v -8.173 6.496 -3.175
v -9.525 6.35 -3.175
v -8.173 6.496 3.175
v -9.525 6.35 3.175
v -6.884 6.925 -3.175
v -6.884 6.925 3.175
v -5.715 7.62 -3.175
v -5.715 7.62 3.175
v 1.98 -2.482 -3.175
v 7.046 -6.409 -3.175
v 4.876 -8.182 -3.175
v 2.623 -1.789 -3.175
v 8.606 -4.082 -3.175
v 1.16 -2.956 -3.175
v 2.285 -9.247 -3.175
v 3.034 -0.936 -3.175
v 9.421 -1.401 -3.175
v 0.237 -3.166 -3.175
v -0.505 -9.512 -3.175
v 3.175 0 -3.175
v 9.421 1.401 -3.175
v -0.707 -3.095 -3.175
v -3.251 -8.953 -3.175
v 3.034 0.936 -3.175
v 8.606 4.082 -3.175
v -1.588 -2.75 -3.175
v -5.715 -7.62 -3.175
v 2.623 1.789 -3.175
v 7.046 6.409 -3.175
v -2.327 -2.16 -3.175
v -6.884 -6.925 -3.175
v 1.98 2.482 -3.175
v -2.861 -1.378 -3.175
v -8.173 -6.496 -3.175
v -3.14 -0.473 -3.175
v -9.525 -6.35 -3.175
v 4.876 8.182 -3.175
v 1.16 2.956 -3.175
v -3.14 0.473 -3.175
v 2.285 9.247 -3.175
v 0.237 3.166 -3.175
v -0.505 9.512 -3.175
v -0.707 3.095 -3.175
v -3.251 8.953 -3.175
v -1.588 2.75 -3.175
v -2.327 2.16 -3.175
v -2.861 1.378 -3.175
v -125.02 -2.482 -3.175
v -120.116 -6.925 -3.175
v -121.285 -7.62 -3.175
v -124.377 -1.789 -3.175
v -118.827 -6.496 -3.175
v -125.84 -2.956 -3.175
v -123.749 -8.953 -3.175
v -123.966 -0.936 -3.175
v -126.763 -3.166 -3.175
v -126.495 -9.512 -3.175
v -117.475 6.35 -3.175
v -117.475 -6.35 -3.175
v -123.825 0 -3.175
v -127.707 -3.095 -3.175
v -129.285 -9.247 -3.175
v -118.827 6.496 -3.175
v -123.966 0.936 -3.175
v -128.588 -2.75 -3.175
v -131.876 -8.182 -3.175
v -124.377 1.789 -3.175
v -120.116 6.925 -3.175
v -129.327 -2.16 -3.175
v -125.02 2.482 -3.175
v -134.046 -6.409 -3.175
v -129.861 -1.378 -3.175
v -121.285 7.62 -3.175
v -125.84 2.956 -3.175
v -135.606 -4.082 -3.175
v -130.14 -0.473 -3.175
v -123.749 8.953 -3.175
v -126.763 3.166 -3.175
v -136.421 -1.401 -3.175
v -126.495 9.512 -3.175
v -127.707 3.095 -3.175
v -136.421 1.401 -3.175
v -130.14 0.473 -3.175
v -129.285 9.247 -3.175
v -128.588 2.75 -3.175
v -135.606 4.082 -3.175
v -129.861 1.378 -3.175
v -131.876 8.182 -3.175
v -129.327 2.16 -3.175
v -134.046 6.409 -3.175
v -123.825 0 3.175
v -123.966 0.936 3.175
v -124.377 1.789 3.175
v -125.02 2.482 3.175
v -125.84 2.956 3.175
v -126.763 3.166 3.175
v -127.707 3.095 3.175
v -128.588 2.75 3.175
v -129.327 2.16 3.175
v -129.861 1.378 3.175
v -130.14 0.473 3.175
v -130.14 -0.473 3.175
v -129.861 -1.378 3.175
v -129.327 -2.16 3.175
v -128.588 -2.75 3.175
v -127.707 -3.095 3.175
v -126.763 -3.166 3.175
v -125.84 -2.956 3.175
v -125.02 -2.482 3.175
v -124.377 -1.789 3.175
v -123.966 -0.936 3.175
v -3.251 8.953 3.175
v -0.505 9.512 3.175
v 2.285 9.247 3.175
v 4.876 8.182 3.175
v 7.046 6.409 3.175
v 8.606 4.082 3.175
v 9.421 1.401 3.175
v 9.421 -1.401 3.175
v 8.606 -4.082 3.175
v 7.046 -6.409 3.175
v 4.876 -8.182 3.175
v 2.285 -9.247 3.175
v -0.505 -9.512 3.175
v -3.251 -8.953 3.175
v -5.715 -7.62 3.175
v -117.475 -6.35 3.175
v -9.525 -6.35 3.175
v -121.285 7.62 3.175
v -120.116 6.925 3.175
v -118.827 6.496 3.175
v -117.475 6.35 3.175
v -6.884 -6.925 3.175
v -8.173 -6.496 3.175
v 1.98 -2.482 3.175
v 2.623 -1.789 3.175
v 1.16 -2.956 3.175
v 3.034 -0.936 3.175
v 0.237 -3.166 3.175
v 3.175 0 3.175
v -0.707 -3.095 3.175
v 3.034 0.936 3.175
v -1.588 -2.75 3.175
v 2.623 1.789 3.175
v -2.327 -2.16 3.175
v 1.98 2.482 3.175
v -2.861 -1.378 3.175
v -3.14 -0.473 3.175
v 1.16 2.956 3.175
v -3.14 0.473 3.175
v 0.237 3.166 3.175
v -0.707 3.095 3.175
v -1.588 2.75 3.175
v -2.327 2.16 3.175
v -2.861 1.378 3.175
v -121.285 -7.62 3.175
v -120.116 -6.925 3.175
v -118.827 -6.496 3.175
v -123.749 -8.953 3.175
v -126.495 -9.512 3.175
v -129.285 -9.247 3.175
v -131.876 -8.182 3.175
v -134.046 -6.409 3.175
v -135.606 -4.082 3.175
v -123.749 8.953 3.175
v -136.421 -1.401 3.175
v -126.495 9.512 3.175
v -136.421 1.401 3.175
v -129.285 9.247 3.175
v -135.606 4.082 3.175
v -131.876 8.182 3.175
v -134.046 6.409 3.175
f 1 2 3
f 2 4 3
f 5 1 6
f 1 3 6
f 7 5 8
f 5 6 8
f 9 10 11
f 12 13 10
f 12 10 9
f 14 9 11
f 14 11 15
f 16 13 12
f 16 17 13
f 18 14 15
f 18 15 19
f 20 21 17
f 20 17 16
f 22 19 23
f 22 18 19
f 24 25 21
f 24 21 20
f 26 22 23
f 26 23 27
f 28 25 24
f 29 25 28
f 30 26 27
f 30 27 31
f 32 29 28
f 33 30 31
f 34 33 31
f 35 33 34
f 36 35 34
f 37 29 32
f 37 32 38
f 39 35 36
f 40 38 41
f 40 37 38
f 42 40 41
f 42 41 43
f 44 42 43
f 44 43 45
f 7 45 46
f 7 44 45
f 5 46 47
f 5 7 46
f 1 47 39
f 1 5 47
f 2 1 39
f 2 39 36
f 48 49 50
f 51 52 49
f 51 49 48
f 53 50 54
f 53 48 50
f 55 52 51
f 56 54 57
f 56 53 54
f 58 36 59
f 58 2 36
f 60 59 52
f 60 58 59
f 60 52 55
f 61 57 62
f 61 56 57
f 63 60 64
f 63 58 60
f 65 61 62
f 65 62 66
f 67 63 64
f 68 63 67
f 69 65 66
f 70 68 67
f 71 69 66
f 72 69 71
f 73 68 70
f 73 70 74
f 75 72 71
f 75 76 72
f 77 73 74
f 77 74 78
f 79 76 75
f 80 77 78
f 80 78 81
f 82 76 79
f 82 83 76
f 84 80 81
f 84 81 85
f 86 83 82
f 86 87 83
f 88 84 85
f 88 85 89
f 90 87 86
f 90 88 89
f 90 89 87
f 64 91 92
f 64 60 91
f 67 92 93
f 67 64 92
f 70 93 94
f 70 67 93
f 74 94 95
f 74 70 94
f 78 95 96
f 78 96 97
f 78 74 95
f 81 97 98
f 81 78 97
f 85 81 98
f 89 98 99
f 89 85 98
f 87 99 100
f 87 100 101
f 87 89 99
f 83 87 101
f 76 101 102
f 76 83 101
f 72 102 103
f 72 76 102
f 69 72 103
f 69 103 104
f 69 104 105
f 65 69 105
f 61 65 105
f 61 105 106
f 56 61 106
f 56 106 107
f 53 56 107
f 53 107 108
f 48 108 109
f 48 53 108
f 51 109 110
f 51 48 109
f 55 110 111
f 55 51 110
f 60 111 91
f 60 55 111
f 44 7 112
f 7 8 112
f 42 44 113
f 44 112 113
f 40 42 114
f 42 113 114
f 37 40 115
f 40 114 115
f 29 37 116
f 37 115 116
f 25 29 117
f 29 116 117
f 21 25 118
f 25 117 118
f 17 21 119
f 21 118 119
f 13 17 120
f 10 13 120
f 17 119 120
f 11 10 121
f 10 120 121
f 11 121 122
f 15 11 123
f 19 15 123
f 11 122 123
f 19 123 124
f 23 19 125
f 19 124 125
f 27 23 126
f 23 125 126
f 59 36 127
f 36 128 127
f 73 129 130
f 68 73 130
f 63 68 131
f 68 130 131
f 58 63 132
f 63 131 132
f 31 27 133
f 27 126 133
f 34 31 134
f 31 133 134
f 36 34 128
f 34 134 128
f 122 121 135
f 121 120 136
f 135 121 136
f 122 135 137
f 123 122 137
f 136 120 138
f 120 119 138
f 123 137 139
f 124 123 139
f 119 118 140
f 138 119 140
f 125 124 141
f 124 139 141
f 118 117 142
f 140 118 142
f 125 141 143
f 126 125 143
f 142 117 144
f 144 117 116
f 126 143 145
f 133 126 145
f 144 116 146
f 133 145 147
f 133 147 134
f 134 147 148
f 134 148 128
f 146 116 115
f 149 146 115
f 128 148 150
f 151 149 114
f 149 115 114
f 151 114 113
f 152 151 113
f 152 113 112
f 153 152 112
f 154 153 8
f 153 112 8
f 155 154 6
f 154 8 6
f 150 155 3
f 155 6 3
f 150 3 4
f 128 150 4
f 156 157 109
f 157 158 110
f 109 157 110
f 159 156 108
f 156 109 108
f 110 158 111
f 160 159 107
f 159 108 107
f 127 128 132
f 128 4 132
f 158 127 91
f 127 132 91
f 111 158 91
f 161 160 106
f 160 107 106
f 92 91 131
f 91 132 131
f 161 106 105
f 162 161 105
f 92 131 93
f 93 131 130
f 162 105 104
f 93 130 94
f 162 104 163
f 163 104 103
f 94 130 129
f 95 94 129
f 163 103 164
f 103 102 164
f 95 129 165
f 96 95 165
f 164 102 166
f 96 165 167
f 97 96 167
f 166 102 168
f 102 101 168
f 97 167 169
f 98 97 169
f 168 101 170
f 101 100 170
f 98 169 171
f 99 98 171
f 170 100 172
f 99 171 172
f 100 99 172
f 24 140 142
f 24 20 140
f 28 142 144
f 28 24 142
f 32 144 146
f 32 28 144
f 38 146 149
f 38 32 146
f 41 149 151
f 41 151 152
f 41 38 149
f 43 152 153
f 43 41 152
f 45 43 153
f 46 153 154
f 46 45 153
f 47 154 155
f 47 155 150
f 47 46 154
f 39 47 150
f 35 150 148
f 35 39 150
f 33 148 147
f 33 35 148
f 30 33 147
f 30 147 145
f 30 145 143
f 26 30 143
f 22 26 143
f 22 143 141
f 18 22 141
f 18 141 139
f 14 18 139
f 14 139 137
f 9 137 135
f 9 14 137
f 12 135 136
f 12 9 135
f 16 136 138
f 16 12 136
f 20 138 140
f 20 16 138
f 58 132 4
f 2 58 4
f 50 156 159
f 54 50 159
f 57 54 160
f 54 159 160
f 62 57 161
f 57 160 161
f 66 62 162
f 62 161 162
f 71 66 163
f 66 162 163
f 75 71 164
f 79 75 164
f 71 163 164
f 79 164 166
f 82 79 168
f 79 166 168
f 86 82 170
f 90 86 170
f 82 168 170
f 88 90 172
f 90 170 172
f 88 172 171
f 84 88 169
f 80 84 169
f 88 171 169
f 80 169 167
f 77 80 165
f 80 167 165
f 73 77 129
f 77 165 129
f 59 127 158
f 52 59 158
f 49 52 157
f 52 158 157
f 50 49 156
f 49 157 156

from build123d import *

# Parameters (mm, degrees)
SKETCH1_R           = 3.175
BOSS_EXTRUDE1_DEPTH = 3.175


with BuildPart() as part:
    # Sketch1 → Boss-Extrude1 (new, symmetric)
    with BuildSketch(Plane.XY):
        with BuildLine():
            Line((-117.475, 6.35), (-9.525, 6.35))
            ThreePointArc((-9.525, 6.35), (-7.516953686, 6.675861057), (-5.715, 7.62))
            ThreePointArc((-5.715, 7.62), (9.525, 0), (-5.715, -7.62))
            ThreePointArc((-5.715, -7.62), (-7.516953686, -6.675861057), (-9.525, -6.35))
            Line((-9.525, -6.35), (-117.475, -6.35))
            ThreePointArc((-117.475, -6.35), (-119.483046314, -6.675861057), (-121.285, -7.62))
            ThreePointArc((-121.285, -7.62), (-136.525, 0), (-121.285, 7.62))
            ThreePointArc((-121.285, 7.62), (-119.483046314, 6.675861057), (-117.475, 6.35))
        make_face()
        with Locations((-127, 0)):
            Circle(SKETCH1_R, mode=Mode.SUBTRACT)
        Circle(SKETCH1_R, mode=Mode.SUBTRACT)
    extrude(amount=BOSS_EXTRUDE1_DEPTH, both=True)


solid = part.part
